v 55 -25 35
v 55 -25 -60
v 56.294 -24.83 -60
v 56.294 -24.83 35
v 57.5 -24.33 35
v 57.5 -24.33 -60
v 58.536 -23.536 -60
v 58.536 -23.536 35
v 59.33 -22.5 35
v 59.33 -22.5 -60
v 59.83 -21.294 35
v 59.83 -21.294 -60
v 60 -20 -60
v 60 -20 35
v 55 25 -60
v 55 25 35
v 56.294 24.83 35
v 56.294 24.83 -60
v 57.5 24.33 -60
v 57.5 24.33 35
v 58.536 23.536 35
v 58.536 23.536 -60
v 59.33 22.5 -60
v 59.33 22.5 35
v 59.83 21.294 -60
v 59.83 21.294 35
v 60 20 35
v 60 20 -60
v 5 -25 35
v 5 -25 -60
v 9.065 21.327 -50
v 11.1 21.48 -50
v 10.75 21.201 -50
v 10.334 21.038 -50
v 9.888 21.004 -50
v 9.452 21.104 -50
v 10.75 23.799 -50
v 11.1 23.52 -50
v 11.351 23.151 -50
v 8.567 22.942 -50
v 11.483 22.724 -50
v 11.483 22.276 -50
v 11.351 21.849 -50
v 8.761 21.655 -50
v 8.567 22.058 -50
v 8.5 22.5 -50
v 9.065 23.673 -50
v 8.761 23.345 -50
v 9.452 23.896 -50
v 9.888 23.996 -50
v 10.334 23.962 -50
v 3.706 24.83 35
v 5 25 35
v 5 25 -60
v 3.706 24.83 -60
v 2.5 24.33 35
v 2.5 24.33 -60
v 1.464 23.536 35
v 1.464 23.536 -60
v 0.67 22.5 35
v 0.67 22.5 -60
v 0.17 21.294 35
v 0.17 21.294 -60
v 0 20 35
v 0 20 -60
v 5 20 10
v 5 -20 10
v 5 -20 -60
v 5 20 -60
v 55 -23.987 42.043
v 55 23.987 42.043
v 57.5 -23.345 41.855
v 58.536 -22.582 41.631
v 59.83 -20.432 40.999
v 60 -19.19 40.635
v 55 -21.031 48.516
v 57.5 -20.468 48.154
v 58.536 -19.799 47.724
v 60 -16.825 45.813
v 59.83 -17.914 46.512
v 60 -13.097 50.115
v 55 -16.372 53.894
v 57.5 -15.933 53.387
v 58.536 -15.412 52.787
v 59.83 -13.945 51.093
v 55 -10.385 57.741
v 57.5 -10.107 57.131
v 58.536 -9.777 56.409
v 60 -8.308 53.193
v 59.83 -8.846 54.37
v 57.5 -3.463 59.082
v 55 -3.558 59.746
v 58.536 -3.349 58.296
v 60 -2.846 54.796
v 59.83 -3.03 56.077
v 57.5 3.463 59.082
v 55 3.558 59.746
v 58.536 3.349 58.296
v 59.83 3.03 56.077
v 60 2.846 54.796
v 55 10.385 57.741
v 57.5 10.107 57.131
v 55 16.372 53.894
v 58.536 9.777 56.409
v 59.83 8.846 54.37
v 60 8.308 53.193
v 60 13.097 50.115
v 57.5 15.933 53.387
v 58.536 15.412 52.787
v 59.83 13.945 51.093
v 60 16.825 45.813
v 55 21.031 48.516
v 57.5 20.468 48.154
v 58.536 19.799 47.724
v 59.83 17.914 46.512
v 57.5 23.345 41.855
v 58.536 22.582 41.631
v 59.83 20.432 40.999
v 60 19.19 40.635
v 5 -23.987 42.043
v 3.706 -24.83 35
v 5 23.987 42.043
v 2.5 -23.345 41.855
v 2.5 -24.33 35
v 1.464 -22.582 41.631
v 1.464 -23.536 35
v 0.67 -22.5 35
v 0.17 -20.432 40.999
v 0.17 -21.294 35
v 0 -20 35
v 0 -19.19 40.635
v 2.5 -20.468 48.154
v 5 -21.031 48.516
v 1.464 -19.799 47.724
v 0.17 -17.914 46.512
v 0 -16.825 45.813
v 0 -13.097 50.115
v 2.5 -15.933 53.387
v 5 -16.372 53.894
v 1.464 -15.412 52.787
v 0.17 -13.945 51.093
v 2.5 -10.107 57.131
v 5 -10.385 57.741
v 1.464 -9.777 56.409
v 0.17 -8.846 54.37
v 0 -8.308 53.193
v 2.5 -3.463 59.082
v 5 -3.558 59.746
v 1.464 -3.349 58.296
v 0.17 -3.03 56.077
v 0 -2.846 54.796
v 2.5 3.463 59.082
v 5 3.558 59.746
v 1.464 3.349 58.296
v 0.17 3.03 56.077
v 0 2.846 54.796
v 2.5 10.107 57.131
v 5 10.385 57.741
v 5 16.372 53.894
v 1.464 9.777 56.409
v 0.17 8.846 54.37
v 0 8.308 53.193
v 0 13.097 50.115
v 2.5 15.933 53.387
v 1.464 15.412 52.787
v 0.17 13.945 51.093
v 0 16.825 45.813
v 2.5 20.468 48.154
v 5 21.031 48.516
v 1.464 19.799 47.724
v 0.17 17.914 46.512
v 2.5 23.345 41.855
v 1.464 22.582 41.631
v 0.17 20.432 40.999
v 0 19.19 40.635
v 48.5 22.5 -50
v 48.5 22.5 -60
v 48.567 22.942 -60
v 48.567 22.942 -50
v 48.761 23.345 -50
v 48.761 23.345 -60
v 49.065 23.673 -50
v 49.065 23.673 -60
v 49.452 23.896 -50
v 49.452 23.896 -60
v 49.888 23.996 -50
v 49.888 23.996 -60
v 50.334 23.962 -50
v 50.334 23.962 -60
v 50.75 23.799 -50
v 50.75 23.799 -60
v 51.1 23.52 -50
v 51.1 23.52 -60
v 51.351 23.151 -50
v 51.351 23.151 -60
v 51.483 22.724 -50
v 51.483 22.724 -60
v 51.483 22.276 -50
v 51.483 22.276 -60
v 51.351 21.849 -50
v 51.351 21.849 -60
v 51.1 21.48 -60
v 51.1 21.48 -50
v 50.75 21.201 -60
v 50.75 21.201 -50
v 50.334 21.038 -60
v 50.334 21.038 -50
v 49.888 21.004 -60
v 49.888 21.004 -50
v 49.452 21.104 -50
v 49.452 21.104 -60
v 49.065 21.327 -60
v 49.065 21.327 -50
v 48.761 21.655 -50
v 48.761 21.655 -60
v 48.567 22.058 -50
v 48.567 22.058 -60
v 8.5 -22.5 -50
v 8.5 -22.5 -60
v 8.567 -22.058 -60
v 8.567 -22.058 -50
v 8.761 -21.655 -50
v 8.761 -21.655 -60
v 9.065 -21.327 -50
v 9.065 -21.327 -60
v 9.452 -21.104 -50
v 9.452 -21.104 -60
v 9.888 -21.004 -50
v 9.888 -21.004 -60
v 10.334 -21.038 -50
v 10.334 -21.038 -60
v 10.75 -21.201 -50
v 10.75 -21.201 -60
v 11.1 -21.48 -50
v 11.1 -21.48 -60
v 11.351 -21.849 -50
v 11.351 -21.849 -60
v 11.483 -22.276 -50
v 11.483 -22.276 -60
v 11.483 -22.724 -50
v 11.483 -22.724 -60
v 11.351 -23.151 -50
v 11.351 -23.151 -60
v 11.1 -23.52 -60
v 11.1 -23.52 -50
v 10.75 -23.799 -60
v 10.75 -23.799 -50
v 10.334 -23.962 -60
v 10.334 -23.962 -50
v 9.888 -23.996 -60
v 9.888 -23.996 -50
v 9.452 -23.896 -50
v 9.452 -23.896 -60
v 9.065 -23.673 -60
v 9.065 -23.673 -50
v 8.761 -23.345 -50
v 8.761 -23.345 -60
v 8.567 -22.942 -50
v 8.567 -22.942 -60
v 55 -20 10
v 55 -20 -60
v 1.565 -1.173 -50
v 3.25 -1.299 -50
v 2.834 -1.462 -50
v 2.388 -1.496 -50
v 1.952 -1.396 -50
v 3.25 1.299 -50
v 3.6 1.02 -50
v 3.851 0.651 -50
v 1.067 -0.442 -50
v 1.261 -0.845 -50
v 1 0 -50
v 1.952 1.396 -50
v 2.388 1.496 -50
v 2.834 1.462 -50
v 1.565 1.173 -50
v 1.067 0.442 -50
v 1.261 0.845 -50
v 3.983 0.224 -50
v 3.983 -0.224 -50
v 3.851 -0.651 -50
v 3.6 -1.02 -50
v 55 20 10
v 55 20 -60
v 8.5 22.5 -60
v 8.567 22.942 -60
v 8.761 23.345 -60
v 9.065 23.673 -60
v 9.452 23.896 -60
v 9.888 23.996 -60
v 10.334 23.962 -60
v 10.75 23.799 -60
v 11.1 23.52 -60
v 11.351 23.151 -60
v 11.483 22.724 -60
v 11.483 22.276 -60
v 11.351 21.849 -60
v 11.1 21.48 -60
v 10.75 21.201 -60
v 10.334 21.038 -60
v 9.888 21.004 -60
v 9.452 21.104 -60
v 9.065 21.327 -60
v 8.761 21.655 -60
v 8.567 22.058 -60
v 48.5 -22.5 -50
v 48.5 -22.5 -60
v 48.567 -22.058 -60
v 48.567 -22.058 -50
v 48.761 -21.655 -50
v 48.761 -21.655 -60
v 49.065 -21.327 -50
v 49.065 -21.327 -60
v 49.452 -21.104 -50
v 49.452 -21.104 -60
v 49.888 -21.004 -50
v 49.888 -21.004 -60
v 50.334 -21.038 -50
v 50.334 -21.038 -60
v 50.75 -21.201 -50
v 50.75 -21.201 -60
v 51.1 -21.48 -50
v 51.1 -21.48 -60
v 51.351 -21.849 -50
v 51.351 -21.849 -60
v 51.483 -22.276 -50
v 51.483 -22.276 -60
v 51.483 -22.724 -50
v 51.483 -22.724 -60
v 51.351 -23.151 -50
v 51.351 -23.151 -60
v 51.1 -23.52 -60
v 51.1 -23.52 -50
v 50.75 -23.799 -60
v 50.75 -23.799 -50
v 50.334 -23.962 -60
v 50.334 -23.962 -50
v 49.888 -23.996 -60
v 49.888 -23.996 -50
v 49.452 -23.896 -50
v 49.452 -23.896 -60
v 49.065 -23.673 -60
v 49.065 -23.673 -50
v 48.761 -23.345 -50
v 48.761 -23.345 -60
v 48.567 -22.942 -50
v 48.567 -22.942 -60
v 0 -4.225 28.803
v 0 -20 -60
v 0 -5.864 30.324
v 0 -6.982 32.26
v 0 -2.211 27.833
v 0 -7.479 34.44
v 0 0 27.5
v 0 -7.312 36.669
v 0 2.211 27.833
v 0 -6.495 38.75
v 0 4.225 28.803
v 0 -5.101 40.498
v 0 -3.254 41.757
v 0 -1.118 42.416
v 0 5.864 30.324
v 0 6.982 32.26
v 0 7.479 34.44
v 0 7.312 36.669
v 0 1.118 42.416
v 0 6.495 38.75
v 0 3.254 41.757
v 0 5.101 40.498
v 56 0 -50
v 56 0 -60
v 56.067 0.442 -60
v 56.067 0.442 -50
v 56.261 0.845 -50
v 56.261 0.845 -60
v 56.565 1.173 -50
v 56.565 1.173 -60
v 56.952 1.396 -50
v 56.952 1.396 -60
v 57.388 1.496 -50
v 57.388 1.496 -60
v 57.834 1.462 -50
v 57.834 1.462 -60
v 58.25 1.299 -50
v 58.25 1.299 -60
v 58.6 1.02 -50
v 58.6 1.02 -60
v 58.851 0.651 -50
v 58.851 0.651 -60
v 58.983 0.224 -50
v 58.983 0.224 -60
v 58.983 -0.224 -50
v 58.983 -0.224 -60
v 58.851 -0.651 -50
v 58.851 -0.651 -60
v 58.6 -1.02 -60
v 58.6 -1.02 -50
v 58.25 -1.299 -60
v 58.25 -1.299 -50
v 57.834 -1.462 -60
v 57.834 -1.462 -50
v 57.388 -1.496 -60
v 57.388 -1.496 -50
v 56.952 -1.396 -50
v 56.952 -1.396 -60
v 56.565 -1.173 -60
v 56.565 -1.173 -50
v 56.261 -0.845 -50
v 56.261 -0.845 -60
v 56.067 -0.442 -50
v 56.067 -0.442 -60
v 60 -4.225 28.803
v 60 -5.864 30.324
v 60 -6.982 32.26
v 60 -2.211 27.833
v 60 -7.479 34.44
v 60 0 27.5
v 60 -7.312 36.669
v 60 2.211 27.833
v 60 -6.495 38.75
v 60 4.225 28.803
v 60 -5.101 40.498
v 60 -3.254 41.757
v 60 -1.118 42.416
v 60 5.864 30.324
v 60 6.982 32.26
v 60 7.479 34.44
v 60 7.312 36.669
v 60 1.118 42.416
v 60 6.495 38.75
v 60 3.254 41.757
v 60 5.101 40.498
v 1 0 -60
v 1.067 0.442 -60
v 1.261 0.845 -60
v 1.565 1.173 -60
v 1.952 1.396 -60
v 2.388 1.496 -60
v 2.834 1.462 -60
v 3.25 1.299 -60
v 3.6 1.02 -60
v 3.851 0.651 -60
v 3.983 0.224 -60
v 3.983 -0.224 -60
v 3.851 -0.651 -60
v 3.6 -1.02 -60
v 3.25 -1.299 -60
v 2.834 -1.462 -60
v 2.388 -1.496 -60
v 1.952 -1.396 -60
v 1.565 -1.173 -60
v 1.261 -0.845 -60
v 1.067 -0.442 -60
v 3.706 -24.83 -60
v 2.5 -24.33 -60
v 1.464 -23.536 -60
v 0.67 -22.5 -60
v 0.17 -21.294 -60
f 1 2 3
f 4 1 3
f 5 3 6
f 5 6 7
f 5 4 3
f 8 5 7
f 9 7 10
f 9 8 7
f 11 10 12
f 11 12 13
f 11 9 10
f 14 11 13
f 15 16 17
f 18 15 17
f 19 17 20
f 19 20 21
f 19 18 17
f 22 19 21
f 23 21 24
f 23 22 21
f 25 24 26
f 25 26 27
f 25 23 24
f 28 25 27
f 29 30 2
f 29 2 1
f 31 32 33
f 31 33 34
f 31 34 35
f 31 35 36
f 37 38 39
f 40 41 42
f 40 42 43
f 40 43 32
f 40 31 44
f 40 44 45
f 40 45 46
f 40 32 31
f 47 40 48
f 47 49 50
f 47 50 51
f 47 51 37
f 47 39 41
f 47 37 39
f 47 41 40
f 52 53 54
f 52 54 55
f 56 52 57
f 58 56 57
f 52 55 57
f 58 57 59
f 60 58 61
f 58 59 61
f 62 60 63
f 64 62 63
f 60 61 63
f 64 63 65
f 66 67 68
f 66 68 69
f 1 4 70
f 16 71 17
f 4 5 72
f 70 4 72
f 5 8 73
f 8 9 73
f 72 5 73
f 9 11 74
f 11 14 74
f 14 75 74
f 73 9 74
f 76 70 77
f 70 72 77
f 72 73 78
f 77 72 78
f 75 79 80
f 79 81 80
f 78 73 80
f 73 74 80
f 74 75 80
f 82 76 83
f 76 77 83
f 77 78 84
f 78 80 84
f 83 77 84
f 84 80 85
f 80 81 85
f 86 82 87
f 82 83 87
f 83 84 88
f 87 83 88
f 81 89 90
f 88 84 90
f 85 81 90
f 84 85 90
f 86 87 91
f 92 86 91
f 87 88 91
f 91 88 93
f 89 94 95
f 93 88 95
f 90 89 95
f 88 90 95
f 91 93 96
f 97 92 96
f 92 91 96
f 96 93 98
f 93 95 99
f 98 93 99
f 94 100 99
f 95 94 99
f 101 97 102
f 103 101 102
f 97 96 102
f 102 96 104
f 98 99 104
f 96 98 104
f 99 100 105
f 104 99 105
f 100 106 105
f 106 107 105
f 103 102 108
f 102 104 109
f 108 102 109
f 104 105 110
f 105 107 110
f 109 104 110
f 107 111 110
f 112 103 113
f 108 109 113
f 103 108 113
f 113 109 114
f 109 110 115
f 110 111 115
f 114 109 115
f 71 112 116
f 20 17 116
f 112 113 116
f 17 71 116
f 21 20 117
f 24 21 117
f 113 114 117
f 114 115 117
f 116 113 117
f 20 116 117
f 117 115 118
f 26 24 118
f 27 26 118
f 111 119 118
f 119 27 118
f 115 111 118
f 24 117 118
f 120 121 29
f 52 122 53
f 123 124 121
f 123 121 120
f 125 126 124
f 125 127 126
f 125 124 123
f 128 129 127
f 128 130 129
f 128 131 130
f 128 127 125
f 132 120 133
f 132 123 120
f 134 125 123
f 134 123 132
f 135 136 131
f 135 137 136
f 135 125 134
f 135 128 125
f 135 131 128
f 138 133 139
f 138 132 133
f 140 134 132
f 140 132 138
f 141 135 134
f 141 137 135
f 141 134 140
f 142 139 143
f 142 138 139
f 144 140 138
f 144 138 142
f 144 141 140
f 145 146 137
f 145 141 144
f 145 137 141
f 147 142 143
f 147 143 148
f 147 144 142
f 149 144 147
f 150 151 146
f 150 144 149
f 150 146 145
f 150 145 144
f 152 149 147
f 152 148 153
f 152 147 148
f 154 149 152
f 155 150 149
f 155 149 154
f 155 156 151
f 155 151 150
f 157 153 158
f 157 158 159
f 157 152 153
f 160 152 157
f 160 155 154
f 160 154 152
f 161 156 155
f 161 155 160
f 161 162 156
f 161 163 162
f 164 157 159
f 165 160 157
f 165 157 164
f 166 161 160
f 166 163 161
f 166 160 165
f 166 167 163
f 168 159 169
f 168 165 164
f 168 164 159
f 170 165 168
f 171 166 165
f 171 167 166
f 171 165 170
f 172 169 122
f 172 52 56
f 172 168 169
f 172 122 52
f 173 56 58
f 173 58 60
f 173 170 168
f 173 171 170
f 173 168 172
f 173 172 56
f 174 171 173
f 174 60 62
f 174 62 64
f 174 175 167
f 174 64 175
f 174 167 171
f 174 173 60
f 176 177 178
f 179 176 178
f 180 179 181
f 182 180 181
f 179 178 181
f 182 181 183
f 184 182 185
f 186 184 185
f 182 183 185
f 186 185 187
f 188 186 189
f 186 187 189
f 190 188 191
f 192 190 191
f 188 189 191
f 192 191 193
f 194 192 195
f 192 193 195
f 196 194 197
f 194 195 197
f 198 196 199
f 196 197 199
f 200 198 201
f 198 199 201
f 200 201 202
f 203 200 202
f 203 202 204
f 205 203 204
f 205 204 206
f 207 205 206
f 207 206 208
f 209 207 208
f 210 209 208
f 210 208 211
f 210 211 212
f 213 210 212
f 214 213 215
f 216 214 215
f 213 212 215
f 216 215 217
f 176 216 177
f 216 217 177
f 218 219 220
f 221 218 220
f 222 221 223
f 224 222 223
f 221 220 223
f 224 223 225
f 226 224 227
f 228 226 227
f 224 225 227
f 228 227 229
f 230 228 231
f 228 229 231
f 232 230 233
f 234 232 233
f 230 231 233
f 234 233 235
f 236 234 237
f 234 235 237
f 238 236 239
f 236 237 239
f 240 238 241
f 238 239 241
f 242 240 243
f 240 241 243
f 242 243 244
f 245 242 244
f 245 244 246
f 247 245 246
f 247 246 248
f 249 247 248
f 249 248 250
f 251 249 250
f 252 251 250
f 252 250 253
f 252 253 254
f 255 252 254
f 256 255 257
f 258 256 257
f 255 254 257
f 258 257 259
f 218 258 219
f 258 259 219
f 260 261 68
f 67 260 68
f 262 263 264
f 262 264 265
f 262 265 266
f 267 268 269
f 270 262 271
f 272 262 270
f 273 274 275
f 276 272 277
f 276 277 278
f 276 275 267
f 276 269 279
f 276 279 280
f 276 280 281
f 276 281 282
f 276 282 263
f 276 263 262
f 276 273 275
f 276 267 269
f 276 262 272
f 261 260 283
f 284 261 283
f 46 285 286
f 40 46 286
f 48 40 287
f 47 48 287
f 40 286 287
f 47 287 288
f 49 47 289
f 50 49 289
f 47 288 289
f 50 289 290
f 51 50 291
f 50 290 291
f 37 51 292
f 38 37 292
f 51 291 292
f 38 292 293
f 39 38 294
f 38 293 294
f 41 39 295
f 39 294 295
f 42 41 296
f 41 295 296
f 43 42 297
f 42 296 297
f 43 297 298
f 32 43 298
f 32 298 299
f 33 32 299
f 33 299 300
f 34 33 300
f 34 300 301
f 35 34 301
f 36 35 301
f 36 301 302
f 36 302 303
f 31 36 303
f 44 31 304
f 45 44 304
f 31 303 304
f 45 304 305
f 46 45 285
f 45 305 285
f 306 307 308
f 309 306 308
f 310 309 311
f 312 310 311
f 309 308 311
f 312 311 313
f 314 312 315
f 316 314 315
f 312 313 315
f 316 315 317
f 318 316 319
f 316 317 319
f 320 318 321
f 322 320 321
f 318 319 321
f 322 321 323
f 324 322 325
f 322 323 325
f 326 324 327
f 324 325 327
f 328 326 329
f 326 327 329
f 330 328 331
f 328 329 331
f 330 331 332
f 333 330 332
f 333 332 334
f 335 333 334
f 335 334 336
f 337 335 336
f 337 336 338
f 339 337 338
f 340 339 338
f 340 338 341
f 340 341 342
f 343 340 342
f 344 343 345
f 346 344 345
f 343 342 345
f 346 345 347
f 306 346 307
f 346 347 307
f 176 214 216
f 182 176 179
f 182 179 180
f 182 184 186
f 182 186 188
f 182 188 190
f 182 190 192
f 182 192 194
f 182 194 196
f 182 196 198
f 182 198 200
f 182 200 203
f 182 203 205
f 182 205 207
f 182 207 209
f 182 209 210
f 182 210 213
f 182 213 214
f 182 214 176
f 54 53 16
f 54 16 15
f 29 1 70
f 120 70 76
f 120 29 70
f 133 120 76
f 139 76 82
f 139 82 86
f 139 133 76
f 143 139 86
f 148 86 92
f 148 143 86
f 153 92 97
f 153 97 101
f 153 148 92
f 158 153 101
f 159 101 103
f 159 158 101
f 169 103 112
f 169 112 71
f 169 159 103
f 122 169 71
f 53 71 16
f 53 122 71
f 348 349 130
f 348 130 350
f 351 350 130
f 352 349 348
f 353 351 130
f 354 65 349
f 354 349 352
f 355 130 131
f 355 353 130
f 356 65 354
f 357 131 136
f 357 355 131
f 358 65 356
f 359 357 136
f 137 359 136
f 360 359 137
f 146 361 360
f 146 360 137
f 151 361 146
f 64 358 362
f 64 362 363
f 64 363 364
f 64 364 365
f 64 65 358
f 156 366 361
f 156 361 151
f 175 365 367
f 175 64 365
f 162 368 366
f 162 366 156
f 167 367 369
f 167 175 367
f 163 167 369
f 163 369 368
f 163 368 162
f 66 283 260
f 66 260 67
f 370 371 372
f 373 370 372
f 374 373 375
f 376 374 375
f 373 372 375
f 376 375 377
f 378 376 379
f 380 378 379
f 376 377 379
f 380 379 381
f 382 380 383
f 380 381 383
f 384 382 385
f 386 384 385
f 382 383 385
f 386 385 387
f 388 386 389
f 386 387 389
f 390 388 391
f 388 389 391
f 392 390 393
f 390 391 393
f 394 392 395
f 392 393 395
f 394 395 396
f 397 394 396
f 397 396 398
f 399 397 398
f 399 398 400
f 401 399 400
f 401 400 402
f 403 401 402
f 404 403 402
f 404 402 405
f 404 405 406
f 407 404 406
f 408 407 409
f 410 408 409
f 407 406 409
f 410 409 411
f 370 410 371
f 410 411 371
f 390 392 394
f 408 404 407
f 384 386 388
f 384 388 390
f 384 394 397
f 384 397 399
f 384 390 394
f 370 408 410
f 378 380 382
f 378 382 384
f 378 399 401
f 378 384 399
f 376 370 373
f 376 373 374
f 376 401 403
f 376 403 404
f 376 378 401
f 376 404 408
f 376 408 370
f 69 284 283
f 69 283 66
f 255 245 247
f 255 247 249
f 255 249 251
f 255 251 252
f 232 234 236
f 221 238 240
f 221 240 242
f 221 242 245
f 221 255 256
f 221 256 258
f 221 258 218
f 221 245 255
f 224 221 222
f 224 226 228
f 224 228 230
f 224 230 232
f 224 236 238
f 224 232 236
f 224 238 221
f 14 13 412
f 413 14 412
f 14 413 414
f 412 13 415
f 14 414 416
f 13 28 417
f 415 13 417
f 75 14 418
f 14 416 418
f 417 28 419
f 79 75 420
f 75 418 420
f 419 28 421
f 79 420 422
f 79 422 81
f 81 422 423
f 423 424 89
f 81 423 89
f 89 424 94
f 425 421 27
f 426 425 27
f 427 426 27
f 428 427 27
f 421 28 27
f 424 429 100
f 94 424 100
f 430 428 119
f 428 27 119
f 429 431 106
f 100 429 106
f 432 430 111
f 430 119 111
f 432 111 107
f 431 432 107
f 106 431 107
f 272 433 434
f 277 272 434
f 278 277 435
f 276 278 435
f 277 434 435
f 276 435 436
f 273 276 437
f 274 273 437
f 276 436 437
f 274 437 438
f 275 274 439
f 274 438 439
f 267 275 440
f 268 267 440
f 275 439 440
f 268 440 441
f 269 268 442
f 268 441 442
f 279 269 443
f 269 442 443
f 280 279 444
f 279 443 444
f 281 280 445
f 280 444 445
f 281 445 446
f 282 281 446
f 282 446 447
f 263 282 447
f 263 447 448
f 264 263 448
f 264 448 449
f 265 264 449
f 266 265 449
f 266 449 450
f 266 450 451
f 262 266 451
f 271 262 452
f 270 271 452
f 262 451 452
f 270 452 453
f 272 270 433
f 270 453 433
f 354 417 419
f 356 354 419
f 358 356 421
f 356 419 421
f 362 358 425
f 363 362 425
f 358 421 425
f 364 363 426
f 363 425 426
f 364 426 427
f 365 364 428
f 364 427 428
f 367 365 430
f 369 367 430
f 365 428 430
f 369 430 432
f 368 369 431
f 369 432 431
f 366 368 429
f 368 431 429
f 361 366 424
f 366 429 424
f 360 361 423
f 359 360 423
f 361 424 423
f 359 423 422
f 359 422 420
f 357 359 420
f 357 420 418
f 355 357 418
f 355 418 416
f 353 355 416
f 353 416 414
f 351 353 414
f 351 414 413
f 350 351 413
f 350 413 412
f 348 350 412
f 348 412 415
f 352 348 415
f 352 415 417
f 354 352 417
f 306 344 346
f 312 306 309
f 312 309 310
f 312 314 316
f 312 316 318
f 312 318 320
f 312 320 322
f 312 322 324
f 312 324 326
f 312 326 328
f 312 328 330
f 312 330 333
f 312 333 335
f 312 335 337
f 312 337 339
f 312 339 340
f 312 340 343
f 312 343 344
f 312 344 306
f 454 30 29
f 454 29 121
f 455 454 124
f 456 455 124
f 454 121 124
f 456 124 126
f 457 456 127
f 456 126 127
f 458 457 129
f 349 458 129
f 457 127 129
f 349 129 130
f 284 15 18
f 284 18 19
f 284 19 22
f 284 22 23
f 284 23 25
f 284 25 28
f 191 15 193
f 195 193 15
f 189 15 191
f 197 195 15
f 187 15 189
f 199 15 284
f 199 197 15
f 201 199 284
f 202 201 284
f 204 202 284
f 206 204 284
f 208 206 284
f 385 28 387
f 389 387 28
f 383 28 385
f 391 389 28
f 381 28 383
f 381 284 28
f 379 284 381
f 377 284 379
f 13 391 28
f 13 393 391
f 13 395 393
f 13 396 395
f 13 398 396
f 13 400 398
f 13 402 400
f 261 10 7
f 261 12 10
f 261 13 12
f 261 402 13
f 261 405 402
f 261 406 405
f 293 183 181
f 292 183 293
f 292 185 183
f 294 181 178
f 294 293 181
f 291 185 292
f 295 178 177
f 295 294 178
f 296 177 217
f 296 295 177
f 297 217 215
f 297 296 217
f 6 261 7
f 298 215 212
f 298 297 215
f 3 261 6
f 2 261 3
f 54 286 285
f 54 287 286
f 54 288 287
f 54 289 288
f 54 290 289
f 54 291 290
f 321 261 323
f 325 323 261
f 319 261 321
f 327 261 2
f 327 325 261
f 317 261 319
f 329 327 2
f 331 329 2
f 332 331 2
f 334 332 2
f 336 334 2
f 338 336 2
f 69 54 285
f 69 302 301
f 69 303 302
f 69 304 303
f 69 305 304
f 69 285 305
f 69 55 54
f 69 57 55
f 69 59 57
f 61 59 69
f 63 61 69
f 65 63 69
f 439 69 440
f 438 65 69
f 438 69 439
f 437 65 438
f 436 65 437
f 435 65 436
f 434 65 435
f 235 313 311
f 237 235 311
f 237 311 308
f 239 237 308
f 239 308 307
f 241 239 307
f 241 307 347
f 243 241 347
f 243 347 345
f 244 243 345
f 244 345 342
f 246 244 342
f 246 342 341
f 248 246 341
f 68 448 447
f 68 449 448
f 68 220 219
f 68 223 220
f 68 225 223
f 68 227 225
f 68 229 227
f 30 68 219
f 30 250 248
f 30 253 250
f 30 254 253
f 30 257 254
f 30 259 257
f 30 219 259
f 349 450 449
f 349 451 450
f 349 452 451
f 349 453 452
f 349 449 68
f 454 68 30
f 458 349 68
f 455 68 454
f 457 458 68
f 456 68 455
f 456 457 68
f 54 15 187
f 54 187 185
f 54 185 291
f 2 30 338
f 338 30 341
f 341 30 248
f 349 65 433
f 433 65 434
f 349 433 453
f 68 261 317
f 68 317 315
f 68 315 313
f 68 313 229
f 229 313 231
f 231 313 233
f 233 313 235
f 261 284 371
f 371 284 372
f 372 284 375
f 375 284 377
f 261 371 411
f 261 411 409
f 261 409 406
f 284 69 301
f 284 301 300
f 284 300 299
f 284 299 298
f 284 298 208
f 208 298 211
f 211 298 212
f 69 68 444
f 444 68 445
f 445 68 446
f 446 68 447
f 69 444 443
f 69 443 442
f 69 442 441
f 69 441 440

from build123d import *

# Parameters (mm, degrees)
BOSS_EXTRUDE1_DEPTH = 60
CUT_EXTRUDE1_REACH  = 90.459
SKETCH2_R           = 7.5
SKETCH3_W           = 50
SKETCH3_H           = 40
CUT_EXTRUDE2_DEPTH  = 70
SKETCH4_R           = 1.5
CUT_EXTRUDE3_DEPTH  = 10
FILLET2_R           = 5


with BuildPart() as part:
    # Sketch1 → Boss-Extrude1 (new body)
    with BuildSketch(Plane(origin=(0, 0, 0), x_dir=(0, 0, -1), z_dir=(1, 0, 0))):
        with BuildLine():
            Line((-35, 25), (60, 25))
            Line((60, 25), (60, -25))
            Line((60, -25), (-35, -25))
            ThreePointArc((-35, -25), (-60, 0), (-35, 25))
        make_face()
    extrude(amount=BOSS_EXTRUDE1_DEPTH)

    # Sketch2 → Cut-Extrude1 (cut, up to next)
    with BuildSketch(Plane(origin=(60, 0, 0), x_dir=(0, 0, -1), z_dir=(1, 0, 0)), mode=Mode.PRIVATE) as cut_extrude1_sk1:
        with Locations((-35, 0)):
            Circle(SKETCH2_R)
    cut_extrude1_tool1 = extrude(cut_extrude1_sk1.sketch, amount=-CUT_EXTRUDE1_REACH, mode=Mode.PRIVATE) & part.part
    add(cut_extrude1_tool1.solids().sort_by_distance((60, 0, 35))[0], mode=Mode.SUBTRACT)

    # Sketch3 → Cut-Extrude2 (cut)
    with BuildSketch(Plane(origin=(0, 0, -60), x_dir=(-1, 0, 0), z_dir=(0, 0, -1))):
        with Locations((-30, 0)):
            Rectangle(SKETCH3_W, SKETCH3_H)
    extrude(amount=-CUT_EXTRUDE2_DEPTH, mode=Mode.SUBTRACT)

    # Sketch4 → Cut-Extrude3 (cut)
    with BuildSketch(Plane(origin=(0, 0, -60), x_dir=(-1, 0, 0), z_dir=(0, 0, -1))):
        with Locations((-50, 22.5)):
            Circle(SKETCH4_R)
        with Locations((-50, -22.5)):
            Circle(SKETCH4_R)
        with Locations((-10, -22.5)):
            Circle(SKETCH4_R)
        with Locations((-10, 22.5)):
            Circle(SKETCH4_R)
        with Locations((-57.5, 0)):
            Circle(SKETCH4_R)
        with Locations((-2.5, 0)):
            Circle(SKETCH4_R)
    extrude(amount=-CUT_EXTRUDE3_DEPTH, mode=Mode.SUBTRACT)

    # Fillet2
    fillet2_edges = [part.edges().sort_by_distance(p)[0] for p in [
        (60, 25, -12.5),
        (60, 0, 60),
        (0, 25, -12.5),
        (0, -25, -12.5),
        (0, 0, 60),
        (60, -25, -12.5),
    ]]
    fillet(fillet2_edges, radius=FILLET2_R)


solid = part.part
